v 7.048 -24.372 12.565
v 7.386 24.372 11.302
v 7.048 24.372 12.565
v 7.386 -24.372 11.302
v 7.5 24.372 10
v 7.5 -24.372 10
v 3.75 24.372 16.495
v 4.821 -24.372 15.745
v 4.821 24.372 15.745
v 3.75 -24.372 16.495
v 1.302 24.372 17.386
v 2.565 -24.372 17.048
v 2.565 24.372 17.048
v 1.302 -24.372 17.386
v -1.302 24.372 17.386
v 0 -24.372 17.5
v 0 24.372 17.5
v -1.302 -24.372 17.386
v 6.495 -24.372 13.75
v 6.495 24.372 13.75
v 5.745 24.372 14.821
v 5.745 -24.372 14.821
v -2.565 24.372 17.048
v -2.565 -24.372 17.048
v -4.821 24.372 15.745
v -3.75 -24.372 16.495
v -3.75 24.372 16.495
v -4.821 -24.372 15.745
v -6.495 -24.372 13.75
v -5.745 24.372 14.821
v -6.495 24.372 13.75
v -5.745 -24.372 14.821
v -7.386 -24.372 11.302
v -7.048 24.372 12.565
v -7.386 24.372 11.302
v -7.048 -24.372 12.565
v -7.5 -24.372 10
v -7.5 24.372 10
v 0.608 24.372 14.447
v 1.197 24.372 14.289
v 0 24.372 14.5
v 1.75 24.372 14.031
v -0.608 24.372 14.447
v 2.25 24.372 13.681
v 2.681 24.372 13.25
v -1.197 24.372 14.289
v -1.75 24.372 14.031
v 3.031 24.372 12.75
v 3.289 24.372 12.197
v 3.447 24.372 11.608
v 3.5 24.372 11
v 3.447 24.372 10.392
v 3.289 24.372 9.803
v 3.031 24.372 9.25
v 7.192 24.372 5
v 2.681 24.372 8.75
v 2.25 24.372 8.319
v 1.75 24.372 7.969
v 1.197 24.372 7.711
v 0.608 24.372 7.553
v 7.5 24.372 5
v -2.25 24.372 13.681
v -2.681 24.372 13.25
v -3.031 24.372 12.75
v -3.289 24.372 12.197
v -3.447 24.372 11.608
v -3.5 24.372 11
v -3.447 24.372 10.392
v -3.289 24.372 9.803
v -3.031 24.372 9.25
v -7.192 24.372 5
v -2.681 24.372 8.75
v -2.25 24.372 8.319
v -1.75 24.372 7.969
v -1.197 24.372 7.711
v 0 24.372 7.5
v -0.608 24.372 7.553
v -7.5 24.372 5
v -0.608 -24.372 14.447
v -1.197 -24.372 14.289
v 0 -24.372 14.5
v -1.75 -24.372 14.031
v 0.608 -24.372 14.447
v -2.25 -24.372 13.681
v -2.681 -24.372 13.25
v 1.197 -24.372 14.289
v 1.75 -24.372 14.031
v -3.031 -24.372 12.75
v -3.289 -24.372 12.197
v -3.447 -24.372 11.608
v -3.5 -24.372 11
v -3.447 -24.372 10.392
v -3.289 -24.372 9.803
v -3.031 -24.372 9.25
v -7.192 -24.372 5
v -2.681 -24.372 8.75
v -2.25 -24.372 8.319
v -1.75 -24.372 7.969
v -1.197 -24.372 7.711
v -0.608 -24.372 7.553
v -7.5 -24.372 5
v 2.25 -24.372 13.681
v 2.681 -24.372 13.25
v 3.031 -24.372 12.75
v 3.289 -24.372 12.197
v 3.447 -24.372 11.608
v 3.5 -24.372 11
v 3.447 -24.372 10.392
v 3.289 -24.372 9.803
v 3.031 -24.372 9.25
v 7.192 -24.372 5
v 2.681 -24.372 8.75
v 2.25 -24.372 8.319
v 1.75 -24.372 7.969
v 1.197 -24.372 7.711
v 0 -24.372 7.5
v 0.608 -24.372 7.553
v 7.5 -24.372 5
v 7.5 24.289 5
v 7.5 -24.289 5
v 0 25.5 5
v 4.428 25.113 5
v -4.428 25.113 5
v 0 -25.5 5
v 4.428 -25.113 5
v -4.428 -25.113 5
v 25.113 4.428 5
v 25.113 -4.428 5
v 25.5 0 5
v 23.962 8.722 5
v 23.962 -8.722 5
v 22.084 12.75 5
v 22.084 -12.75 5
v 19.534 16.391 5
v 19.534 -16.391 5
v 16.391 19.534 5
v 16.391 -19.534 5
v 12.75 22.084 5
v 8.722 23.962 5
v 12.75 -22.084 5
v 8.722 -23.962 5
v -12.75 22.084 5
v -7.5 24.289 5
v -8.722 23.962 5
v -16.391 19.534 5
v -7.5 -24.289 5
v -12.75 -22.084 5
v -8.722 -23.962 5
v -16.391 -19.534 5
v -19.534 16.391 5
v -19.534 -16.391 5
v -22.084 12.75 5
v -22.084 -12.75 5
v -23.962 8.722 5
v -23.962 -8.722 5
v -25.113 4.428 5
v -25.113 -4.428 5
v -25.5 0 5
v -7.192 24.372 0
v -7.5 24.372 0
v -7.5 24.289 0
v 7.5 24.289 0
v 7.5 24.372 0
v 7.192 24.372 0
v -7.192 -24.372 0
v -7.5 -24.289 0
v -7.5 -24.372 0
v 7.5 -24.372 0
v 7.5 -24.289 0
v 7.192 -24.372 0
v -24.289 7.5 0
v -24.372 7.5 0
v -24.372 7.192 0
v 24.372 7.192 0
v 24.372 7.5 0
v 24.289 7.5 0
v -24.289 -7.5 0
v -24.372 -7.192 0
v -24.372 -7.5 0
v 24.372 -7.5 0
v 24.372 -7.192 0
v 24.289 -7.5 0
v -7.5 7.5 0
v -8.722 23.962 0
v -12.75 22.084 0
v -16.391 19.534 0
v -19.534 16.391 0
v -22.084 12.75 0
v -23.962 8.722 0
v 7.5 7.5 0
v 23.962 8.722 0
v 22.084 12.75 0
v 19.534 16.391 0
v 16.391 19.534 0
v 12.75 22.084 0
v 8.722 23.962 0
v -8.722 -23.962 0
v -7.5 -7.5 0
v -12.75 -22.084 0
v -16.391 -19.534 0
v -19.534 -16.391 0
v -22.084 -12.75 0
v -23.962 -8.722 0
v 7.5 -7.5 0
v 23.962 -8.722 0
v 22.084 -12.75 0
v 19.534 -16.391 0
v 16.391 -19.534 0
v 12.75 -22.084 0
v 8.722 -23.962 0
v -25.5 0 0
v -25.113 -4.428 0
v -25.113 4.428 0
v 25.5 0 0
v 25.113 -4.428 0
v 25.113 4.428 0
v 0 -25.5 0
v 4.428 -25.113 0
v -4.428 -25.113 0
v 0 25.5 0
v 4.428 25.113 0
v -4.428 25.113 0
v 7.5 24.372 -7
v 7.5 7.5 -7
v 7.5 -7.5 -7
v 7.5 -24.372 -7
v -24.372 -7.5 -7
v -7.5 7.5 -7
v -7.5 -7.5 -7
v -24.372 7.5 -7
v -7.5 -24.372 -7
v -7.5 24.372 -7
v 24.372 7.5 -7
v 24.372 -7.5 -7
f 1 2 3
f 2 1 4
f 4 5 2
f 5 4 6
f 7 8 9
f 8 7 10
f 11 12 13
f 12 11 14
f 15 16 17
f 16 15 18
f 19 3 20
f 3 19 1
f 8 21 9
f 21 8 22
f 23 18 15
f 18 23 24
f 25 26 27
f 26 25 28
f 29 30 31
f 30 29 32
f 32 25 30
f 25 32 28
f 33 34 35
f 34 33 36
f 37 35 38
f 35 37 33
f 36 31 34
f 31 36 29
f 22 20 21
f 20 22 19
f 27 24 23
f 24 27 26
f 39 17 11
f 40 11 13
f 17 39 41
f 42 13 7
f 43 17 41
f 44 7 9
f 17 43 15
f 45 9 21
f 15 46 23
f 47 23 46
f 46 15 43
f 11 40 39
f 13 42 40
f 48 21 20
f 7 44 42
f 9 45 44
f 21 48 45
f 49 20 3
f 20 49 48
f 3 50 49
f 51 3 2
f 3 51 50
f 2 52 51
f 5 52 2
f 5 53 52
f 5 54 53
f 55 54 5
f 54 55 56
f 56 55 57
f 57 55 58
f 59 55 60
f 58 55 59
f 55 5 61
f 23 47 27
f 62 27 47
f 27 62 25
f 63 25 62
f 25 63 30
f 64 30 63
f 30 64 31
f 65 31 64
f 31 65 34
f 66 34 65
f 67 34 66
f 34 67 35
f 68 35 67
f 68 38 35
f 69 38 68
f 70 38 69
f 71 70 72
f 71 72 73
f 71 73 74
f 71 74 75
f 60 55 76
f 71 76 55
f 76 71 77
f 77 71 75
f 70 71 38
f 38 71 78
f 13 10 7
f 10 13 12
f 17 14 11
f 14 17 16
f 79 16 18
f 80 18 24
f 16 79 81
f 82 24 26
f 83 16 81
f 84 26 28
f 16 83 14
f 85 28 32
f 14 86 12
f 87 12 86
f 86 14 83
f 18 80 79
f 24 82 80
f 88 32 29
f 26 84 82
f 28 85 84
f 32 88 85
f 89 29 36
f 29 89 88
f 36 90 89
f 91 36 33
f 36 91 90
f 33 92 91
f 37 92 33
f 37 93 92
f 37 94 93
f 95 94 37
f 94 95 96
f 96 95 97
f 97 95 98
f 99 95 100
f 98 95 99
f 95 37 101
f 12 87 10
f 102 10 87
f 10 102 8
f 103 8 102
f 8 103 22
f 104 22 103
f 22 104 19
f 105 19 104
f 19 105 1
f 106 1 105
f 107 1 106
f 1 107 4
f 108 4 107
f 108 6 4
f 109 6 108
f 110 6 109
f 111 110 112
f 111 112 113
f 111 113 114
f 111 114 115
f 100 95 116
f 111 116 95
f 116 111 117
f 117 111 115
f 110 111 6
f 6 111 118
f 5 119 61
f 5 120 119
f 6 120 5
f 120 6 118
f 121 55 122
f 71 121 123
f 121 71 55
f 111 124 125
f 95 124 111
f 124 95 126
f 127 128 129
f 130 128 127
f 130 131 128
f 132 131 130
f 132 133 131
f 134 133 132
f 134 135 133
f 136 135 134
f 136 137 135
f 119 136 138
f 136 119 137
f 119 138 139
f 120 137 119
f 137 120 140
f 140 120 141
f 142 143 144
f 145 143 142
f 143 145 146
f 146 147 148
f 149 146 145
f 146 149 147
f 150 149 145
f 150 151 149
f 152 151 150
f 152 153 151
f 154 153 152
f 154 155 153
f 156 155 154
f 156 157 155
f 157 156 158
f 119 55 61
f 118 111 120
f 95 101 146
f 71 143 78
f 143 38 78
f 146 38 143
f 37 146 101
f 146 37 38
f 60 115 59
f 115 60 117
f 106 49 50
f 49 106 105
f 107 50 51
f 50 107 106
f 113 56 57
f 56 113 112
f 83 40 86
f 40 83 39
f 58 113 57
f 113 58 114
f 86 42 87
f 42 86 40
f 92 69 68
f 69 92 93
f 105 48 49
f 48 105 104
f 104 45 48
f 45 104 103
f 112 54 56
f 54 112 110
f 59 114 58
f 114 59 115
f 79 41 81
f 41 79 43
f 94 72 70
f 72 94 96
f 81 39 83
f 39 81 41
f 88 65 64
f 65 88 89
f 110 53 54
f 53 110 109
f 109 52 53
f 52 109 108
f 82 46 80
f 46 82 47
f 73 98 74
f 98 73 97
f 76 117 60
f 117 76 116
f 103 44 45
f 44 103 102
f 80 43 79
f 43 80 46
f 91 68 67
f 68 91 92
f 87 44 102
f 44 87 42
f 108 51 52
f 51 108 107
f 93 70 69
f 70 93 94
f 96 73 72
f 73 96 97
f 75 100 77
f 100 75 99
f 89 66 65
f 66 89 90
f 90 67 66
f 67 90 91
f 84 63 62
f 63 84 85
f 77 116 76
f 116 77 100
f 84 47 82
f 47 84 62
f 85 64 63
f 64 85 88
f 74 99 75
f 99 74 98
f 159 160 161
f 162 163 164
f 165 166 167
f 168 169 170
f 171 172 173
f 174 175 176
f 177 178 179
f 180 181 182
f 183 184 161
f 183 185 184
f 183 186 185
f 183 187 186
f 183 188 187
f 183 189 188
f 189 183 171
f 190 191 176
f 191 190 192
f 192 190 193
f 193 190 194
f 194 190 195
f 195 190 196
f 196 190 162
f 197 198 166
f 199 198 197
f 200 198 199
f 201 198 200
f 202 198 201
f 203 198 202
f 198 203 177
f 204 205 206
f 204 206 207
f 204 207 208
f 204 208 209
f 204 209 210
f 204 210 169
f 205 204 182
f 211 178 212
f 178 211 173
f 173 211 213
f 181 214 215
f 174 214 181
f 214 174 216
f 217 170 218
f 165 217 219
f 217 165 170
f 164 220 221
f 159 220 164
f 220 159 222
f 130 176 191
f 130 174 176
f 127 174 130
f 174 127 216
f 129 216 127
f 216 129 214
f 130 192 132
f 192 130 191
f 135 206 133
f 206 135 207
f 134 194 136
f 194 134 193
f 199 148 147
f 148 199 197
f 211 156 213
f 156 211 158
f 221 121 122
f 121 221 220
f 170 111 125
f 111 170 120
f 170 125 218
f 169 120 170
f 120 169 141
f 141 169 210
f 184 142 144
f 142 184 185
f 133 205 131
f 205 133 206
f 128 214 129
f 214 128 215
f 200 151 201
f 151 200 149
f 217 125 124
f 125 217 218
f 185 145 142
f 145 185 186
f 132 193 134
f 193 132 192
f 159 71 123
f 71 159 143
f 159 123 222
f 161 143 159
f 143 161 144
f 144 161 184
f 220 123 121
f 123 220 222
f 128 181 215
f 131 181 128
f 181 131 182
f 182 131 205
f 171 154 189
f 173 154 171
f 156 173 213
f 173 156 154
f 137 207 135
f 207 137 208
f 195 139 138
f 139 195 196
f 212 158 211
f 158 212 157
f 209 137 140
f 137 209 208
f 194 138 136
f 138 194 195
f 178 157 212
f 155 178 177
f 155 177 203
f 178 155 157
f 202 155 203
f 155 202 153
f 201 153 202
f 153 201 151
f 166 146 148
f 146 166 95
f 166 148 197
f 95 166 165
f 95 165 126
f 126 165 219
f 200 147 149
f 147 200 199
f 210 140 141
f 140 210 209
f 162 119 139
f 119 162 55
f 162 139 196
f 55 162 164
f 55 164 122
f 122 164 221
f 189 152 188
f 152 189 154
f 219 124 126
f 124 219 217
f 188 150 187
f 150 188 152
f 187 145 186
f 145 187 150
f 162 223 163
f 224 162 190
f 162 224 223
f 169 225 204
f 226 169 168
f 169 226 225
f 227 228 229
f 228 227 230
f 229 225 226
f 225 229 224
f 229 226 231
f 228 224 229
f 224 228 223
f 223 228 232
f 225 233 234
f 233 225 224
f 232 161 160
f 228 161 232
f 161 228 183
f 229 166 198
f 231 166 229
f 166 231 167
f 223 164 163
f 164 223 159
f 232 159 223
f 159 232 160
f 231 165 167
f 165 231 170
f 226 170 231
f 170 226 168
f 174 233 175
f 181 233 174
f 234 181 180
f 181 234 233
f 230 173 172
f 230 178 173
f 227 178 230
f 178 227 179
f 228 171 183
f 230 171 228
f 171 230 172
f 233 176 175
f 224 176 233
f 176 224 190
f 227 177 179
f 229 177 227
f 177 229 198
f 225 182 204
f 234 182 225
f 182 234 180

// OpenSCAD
$fn = 36;

disch  = 5;
discd  = 51;

blockw = 15;
blockh = 7;
blockl = 2 * sqrt(((discd/2)^2) - ((blockw/2)^2));

hole   = 7;

stub   = 5;

cylinder(h = disch, d = discd);

translate([-blockw/2,-blockl/2,-blockh]){
    cube([blockw, blockl, blockh]);
}

translate([-blockl/2,-blockw/2,-blockh]){
    cube([blockl, blockw, blockh]);
}

difference(){
    union(){
        translate([0,blockl/2,disch+stub]){
            rotate([90,0,0]){
                cylinder(h = blockl, d = blockw);
            }
        }
        translate([-blockw/2,-blockl/2,stub]){
            cube([blockw, blockl, stub]);
        }
    }
    
    translate([0,blockl/2,disch+(hole/2)+(stub/2)]){
        rotate([90,0,0]){
            cylinder(h = blockl, d = hole);
        }
    }
    
}
